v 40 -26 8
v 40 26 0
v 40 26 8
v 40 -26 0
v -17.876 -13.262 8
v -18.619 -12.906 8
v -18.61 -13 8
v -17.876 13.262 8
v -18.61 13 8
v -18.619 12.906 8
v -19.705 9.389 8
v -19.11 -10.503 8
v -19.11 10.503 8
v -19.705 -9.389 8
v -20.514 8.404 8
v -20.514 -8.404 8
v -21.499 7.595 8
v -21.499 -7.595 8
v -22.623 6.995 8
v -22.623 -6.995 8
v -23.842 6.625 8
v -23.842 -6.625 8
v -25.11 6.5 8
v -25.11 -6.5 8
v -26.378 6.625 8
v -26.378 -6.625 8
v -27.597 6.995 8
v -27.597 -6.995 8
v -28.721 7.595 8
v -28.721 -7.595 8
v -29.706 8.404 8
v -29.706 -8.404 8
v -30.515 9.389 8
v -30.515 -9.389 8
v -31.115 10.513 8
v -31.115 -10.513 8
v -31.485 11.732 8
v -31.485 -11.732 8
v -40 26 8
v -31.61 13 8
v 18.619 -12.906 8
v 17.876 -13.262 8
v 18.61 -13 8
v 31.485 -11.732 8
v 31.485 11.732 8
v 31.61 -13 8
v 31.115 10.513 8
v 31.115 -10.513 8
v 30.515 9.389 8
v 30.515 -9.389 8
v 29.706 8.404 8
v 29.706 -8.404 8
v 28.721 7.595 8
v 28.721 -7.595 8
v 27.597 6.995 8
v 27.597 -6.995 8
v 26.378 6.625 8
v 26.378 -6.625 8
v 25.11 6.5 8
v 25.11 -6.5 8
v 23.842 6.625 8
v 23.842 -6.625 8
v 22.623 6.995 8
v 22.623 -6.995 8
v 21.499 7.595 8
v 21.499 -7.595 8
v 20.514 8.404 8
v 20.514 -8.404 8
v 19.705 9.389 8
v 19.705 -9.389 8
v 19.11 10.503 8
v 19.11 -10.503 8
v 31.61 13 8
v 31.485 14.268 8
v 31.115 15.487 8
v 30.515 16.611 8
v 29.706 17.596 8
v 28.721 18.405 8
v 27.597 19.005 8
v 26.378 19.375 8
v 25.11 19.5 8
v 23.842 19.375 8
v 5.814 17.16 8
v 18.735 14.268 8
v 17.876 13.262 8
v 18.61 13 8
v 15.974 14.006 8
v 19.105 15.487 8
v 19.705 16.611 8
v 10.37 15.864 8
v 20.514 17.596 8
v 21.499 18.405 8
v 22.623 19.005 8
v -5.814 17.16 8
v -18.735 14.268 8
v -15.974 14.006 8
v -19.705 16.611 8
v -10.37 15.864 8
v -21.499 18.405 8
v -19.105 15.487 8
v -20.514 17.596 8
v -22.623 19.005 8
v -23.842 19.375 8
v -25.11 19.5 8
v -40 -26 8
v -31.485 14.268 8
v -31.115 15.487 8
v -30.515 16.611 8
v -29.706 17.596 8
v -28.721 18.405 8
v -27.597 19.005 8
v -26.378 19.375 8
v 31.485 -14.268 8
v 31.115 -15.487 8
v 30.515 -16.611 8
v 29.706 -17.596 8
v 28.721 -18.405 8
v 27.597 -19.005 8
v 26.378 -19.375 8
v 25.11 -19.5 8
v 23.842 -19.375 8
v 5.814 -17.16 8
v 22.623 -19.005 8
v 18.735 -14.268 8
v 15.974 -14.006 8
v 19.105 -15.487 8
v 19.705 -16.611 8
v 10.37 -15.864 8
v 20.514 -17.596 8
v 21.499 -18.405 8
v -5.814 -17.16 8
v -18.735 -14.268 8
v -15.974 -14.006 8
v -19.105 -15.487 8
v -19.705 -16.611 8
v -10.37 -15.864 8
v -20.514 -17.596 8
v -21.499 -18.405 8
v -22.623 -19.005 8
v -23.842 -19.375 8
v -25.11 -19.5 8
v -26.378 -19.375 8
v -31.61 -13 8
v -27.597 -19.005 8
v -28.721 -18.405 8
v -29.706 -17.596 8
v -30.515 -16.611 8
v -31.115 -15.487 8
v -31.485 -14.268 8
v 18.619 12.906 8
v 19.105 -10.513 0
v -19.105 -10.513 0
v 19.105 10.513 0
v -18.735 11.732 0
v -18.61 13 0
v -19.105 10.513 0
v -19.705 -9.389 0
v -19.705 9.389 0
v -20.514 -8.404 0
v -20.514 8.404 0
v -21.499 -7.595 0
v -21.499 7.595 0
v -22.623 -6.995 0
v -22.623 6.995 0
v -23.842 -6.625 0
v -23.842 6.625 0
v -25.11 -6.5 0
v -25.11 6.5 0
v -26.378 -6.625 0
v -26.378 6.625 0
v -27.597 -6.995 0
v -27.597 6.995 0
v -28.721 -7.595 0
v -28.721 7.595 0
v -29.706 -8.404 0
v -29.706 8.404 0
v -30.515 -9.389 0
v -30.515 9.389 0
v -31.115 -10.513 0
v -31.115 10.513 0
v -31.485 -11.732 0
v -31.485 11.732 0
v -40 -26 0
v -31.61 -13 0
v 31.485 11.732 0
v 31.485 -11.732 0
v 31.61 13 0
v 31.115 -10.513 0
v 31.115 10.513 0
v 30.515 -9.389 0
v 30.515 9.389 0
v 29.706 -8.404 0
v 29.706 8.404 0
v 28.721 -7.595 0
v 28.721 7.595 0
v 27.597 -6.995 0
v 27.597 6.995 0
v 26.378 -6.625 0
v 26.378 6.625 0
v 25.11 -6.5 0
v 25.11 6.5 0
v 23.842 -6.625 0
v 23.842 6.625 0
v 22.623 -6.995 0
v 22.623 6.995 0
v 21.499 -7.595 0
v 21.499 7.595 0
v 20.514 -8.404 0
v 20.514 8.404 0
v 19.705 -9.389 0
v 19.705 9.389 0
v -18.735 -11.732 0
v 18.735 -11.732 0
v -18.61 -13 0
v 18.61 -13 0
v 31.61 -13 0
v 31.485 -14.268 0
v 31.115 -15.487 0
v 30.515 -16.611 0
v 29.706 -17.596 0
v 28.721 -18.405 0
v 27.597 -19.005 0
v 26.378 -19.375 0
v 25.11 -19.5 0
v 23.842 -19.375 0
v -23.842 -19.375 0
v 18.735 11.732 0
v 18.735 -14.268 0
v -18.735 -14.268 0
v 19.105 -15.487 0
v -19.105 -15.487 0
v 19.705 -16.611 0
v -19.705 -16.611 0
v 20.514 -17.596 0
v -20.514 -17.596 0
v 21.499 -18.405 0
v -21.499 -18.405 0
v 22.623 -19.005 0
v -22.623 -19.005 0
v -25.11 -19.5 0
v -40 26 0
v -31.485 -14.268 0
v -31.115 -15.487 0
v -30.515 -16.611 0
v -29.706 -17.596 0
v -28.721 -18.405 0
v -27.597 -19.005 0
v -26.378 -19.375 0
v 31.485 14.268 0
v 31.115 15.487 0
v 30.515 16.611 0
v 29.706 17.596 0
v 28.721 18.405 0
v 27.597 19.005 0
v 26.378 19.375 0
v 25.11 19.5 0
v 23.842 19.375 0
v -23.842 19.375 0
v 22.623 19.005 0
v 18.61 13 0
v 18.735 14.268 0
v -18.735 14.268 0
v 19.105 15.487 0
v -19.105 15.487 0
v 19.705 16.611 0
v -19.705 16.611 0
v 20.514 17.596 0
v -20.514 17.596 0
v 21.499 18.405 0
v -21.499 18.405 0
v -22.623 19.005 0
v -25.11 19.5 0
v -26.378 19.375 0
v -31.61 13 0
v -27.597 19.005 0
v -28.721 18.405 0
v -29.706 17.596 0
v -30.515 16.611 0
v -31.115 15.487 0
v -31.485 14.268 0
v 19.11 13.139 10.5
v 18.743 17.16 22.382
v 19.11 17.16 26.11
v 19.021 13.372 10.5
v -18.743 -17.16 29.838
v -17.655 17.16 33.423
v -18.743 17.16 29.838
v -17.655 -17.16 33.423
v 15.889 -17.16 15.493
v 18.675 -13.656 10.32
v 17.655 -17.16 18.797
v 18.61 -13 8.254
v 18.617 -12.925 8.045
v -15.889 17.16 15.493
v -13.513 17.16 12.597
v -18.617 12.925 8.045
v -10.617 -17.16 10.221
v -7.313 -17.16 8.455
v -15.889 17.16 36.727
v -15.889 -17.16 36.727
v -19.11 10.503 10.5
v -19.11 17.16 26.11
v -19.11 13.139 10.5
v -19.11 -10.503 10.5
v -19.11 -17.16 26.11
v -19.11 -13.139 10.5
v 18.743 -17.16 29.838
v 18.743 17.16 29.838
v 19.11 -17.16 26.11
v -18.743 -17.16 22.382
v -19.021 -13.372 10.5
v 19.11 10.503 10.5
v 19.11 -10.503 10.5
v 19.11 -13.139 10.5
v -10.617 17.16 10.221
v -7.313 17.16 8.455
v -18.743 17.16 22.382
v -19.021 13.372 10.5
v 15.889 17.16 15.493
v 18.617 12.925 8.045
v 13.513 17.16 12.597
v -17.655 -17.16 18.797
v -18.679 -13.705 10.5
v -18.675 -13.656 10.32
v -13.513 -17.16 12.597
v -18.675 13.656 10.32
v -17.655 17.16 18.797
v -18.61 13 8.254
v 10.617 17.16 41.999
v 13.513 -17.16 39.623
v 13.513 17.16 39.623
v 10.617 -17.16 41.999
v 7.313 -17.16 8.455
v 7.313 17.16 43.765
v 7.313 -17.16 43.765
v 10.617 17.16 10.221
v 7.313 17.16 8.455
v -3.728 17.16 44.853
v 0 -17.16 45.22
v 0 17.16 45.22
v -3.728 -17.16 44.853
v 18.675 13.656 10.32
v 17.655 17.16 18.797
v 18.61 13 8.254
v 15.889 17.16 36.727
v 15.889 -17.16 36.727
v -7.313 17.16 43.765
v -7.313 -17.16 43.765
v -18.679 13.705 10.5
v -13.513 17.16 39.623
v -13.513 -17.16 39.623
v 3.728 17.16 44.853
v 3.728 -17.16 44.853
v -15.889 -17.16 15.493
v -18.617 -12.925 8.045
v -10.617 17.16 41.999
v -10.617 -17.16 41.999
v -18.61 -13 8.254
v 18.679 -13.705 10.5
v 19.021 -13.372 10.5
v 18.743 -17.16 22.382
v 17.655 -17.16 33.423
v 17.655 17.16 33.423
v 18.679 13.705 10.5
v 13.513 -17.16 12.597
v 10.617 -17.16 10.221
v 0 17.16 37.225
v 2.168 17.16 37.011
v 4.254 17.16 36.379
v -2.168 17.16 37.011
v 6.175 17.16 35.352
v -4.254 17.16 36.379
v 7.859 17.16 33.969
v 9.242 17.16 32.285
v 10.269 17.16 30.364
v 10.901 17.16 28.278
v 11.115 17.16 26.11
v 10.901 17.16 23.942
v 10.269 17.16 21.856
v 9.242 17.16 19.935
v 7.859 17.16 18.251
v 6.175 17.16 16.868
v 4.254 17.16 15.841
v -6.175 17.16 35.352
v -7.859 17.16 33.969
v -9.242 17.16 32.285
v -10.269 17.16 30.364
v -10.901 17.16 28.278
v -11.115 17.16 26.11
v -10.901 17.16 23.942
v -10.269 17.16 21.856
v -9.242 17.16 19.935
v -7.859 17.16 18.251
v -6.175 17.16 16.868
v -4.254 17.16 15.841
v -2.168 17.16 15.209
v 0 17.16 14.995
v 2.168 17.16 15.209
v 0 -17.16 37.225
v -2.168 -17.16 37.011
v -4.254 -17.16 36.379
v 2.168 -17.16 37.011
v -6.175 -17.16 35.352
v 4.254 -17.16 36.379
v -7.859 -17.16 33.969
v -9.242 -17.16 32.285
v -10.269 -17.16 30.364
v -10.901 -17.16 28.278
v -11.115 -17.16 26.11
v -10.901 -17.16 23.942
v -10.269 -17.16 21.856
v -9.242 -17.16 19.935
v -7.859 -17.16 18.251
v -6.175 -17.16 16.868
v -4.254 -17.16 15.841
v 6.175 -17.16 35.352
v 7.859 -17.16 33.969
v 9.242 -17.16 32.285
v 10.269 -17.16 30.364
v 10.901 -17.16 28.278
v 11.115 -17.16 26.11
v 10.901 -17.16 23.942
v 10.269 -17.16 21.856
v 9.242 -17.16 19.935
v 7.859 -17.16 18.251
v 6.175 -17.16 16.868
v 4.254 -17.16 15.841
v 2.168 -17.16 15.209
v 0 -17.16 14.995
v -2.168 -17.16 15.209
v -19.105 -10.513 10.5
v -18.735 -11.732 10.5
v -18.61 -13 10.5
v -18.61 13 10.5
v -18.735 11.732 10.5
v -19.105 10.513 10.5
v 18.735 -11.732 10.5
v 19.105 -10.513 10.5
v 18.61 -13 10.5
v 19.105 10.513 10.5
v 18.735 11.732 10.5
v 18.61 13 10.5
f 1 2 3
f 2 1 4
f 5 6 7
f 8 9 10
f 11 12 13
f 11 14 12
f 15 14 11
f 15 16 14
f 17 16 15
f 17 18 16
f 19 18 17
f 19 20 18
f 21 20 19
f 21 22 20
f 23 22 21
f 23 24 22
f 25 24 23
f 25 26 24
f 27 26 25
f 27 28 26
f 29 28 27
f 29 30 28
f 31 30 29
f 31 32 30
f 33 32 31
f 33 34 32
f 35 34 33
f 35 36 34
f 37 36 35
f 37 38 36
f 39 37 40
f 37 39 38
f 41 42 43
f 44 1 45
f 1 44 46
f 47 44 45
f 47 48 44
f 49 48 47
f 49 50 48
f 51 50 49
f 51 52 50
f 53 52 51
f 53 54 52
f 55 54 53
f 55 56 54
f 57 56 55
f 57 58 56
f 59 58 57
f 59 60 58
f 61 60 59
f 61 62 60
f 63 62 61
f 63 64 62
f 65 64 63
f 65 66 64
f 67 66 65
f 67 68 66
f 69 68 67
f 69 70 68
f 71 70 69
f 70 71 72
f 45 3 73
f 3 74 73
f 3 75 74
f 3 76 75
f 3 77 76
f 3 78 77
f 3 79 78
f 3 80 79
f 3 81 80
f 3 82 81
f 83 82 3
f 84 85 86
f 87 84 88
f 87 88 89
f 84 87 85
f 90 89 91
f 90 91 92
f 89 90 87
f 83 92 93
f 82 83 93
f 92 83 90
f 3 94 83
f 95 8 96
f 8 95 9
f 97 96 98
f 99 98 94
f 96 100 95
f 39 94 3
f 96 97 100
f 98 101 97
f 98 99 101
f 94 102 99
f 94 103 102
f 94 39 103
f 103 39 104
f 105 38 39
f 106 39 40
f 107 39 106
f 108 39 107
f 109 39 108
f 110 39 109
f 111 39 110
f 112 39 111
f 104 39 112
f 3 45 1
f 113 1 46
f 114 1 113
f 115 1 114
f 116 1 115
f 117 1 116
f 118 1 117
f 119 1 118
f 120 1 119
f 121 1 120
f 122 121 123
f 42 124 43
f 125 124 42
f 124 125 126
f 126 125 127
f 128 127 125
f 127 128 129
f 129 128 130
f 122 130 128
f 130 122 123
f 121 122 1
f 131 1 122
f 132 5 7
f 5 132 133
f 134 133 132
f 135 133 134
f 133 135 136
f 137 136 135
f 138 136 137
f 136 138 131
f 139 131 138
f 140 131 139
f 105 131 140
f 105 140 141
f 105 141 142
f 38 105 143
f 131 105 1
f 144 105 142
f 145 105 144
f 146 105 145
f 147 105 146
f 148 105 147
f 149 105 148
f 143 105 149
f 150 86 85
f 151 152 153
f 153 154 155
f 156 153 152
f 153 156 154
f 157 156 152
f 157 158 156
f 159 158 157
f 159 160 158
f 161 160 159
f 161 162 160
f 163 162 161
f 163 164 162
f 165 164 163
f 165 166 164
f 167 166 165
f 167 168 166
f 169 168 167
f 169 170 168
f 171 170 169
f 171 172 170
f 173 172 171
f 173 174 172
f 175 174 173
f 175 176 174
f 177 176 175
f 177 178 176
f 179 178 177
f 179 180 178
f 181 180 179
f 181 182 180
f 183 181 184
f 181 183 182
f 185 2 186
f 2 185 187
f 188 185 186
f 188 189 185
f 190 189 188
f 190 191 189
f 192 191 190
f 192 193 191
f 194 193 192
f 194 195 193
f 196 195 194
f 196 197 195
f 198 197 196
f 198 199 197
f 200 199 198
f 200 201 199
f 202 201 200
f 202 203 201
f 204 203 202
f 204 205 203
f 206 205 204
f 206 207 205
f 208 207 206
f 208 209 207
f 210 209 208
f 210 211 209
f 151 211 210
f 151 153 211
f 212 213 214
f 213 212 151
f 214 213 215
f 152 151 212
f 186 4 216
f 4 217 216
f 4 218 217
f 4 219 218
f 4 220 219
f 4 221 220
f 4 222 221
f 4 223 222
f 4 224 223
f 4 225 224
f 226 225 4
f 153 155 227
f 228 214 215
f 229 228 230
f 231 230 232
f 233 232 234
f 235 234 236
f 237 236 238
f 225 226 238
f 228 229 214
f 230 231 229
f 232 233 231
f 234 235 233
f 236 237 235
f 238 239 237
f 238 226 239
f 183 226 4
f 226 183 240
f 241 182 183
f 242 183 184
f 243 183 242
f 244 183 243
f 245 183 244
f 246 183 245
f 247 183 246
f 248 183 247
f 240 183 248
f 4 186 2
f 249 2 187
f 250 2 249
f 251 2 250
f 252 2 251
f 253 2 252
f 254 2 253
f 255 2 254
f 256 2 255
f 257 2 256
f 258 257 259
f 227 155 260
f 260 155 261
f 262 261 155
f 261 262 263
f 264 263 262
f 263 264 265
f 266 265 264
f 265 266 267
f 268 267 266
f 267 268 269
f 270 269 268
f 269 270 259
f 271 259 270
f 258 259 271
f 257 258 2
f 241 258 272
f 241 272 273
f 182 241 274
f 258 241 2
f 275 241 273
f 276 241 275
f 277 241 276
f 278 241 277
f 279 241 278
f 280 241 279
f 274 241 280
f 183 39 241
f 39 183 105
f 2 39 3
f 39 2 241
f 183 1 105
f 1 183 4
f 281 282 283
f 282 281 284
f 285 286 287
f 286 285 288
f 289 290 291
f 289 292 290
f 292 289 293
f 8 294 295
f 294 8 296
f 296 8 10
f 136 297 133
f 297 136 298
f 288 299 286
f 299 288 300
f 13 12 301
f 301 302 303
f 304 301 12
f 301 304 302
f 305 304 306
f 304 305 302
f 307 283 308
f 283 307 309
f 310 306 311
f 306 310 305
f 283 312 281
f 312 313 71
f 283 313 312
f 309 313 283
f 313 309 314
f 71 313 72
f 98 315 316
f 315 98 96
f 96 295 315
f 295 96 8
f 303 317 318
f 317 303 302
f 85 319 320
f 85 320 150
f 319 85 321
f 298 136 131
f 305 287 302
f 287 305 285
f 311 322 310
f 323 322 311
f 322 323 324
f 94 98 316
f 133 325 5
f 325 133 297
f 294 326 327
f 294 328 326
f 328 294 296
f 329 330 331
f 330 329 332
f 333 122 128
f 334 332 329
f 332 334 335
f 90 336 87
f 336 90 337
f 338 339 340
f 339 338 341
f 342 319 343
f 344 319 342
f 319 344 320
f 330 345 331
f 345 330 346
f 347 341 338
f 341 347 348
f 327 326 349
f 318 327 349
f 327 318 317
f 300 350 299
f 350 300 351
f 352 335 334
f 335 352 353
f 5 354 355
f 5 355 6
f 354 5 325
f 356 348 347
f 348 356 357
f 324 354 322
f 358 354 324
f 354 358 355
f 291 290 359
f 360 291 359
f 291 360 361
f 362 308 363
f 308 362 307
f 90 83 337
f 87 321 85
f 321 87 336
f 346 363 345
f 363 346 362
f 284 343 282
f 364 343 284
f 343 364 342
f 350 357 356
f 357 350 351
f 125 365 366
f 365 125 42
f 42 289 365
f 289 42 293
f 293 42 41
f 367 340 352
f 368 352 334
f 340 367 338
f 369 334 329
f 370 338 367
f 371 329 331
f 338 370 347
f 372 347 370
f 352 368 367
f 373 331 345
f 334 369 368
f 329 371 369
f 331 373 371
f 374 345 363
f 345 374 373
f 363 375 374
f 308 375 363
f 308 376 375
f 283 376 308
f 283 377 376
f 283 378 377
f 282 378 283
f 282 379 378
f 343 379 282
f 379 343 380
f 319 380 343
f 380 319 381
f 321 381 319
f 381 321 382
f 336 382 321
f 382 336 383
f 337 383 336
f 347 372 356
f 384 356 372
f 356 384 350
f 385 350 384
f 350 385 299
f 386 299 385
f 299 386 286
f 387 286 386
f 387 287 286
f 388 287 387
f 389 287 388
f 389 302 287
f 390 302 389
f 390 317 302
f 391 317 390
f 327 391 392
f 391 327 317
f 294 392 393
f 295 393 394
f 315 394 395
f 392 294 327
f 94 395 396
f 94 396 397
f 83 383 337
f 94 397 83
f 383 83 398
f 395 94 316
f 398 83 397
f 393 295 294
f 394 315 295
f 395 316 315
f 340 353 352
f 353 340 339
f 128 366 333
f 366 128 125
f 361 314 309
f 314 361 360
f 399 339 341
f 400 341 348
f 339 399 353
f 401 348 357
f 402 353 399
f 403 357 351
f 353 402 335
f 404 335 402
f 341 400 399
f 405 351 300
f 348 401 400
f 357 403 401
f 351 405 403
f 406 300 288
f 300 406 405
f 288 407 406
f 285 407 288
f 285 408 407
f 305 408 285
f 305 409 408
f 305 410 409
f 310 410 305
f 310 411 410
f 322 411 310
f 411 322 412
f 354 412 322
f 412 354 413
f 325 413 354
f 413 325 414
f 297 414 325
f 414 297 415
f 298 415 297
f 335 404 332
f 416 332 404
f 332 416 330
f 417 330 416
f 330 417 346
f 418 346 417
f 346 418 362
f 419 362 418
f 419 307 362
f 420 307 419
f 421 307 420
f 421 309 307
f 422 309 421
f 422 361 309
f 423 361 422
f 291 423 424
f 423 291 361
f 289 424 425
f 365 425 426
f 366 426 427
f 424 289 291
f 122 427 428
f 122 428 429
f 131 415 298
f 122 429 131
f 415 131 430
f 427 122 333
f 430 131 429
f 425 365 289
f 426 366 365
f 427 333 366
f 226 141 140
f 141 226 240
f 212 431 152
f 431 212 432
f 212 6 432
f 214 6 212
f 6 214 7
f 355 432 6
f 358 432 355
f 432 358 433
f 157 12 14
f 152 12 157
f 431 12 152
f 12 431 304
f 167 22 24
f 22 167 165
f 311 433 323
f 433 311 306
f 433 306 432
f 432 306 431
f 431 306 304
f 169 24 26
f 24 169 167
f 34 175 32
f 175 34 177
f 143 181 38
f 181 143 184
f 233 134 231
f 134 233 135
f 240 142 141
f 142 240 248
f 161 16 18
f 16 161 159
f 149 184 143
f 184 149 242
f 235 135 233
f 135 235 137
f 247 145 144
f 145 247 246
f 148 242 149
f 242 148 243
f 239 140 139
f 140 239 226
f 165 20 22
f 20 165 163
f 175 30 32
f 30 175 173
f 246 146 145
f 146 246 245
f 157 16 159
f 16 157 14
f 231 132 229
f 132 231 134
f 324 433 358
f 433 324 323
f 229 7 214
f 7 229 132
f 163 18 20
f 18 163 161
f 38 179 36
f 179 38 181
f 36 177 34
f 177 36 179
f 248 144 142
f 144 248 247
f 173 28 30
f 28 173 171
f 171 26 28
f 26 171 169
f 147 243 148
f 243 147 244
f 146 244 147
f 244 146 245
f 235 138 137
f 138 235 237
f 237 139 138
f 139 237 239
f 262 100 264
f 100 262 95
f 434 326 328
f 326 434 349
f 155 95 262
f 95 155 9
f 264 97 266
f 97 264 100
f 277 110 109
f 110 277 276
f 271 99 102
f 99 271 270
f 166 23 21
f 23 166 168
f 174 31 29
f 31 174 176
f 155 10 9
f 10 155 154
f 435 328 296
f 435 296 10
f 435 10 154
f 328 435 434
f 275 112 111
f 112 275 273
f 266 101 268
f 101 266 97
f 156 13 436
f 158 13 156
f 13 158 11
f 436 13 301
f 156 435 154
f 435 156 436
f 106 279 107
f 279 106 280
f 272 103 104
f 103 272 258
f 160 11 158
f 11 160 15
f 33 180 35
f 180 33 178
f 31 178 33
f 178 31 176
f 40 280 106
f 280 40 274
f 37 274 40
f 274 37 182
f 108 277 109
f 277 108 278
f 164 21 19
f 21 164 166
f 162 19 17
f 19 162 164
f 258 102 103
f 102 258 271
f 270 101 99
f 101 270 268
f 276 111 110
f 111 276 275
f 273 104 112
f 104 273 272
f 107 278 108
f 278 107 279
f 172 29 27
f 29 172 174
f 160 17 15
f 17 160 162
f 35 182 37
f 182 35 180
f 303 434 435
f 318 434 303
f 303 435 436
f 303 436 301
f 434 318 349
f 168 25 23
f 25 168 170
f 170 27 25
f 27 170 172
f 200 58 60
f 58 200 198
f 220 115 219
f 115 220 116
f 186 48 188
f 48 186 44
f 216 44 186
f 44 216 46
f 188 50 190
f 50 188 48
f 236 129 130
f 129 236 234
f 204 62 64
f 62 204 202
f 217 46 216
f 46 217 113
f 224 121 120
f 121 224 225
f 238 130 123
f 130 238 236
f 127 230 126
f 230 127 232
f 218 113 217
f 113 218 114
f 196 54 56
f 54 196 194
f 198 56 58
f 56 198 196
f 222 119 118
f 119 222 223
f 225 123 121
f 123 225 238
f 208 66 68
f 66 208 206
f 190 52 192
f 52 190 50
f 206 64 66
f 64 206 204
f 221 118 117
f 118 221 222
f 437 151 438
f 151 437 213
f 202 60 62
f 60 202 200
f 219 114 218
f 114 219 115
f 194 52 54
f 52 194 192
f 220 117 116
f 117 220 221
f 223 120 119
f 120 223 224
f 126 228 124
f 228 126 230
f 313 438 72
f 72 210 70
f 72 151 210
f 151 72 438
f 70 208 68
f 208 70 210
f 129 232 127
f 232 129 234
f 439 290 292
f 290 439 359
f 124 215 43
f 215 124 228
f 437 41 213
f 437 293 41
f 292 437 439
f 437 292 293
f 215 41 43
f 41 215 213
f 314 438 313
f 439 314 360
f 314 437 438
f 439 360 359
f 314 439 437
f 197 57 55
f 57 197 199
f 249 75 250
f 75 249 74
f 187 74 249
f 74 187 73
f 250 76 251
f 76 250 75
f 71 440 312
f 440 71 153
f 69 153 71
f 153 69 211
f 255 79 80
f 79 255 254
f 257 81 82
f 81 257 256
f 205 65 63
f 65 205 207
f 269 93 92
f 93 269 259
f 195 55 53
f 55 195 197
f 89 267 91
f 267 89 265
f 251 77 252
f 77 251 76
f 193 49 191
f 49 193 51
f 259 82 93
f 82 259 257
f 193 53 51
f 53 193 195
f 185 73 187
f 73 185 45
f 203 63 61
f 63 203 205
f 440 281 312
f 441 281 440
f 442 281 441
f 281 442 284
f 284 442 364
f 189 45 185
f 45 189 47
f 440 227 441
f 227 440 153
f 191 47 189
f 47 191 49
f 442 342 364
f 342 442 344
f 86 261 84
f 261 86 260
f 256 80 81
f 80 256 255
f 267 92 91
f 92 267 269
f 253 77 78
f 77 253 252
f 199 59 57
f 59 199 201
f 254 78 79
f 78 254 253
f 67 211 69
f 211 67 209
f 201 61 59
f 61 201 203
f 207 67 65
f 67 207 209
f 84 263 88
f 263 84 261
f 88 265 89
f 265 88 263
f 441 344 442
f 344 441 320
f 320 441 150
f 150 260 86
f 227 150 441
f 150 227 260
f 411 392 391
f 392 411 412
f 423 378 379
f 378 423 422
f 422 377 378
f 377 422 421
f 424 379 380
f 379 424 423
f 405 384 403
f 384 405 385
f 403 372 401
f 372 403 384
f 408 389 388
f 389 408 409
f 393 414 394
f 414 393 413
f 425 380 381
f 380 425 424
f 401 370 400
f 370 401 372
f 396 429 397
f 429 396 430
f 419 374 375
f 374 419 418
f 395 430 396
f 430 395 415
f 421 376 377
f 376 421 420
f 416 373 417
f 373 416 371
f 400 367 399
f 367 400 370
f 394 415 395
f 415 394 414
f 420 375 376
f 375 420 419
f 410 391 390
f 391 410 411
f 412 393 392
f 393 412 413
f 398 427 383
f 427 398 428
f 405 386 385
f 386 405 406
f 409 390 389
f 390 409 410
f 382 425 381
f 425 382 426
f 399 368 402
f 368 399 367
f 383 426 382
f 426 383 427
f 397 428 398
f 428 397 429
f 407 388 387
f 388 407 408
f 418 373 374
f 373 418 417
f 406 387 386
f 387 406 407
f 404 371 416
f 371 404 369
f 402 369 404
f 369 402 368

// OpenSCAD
$fn = 32;

// ----------------------------------------------------------------------
// Bearing block: 80 x 52 mm base, 22.23 mm bore at 26.11 mm
// ----------------------------------------------------------------------

// --- parameters (mm) ---
base_w = 80;              // base width
base_d = 52;              // base depth
base_t = 8;               // base thickness
bore_d = 22.23;           // shaft / bearing bore
house_r = 19.11;          // housing outer radius
house_len = 34.32;        // housing length along the shaft
foot_w = 38.22;           // foot width under the housing
foot_len = 24.32;         // foot length along the shaft
axis_z = 26.11;           // bore axis height above the base
holes_d = 13;             // mounting holes
hole_x = 25.11;           // mounting hole spacing

difference() {
  union() {
    /* base plate with its underside on z = 0 */
    translate([0, 0, base_t / 2]) cube([base_w, base_d, base_t], center = true);
    /* hull foot: a straight web blending into the round housing */
    hull() {
      translate([0, 0, base_t - 0.5]) cube([foot_w, foot_len, 1.6], center = true);
      translate([0, 0, axis_z]) rotate([-90, 0, 0]) cylinder(h = house_len, d = 2 * house_r, center = true);
    }
  }
  /* bore through the housing, 2.5 mm clear on both sides */
  translate([0, 0, axis_z]) rotate([-90, 0, 0]) cylinder(h = house_len + 5, d = bore_d, center = true);
  /* mounting holes through the base plate */
  for (hx = [-25.11, 25.11]) {
    for (hy = [-13, 13]) {
      translate([hx, hy, -2.5]) cylinder(h = base_t + 5, d = holes_d);
    }
  }
}
